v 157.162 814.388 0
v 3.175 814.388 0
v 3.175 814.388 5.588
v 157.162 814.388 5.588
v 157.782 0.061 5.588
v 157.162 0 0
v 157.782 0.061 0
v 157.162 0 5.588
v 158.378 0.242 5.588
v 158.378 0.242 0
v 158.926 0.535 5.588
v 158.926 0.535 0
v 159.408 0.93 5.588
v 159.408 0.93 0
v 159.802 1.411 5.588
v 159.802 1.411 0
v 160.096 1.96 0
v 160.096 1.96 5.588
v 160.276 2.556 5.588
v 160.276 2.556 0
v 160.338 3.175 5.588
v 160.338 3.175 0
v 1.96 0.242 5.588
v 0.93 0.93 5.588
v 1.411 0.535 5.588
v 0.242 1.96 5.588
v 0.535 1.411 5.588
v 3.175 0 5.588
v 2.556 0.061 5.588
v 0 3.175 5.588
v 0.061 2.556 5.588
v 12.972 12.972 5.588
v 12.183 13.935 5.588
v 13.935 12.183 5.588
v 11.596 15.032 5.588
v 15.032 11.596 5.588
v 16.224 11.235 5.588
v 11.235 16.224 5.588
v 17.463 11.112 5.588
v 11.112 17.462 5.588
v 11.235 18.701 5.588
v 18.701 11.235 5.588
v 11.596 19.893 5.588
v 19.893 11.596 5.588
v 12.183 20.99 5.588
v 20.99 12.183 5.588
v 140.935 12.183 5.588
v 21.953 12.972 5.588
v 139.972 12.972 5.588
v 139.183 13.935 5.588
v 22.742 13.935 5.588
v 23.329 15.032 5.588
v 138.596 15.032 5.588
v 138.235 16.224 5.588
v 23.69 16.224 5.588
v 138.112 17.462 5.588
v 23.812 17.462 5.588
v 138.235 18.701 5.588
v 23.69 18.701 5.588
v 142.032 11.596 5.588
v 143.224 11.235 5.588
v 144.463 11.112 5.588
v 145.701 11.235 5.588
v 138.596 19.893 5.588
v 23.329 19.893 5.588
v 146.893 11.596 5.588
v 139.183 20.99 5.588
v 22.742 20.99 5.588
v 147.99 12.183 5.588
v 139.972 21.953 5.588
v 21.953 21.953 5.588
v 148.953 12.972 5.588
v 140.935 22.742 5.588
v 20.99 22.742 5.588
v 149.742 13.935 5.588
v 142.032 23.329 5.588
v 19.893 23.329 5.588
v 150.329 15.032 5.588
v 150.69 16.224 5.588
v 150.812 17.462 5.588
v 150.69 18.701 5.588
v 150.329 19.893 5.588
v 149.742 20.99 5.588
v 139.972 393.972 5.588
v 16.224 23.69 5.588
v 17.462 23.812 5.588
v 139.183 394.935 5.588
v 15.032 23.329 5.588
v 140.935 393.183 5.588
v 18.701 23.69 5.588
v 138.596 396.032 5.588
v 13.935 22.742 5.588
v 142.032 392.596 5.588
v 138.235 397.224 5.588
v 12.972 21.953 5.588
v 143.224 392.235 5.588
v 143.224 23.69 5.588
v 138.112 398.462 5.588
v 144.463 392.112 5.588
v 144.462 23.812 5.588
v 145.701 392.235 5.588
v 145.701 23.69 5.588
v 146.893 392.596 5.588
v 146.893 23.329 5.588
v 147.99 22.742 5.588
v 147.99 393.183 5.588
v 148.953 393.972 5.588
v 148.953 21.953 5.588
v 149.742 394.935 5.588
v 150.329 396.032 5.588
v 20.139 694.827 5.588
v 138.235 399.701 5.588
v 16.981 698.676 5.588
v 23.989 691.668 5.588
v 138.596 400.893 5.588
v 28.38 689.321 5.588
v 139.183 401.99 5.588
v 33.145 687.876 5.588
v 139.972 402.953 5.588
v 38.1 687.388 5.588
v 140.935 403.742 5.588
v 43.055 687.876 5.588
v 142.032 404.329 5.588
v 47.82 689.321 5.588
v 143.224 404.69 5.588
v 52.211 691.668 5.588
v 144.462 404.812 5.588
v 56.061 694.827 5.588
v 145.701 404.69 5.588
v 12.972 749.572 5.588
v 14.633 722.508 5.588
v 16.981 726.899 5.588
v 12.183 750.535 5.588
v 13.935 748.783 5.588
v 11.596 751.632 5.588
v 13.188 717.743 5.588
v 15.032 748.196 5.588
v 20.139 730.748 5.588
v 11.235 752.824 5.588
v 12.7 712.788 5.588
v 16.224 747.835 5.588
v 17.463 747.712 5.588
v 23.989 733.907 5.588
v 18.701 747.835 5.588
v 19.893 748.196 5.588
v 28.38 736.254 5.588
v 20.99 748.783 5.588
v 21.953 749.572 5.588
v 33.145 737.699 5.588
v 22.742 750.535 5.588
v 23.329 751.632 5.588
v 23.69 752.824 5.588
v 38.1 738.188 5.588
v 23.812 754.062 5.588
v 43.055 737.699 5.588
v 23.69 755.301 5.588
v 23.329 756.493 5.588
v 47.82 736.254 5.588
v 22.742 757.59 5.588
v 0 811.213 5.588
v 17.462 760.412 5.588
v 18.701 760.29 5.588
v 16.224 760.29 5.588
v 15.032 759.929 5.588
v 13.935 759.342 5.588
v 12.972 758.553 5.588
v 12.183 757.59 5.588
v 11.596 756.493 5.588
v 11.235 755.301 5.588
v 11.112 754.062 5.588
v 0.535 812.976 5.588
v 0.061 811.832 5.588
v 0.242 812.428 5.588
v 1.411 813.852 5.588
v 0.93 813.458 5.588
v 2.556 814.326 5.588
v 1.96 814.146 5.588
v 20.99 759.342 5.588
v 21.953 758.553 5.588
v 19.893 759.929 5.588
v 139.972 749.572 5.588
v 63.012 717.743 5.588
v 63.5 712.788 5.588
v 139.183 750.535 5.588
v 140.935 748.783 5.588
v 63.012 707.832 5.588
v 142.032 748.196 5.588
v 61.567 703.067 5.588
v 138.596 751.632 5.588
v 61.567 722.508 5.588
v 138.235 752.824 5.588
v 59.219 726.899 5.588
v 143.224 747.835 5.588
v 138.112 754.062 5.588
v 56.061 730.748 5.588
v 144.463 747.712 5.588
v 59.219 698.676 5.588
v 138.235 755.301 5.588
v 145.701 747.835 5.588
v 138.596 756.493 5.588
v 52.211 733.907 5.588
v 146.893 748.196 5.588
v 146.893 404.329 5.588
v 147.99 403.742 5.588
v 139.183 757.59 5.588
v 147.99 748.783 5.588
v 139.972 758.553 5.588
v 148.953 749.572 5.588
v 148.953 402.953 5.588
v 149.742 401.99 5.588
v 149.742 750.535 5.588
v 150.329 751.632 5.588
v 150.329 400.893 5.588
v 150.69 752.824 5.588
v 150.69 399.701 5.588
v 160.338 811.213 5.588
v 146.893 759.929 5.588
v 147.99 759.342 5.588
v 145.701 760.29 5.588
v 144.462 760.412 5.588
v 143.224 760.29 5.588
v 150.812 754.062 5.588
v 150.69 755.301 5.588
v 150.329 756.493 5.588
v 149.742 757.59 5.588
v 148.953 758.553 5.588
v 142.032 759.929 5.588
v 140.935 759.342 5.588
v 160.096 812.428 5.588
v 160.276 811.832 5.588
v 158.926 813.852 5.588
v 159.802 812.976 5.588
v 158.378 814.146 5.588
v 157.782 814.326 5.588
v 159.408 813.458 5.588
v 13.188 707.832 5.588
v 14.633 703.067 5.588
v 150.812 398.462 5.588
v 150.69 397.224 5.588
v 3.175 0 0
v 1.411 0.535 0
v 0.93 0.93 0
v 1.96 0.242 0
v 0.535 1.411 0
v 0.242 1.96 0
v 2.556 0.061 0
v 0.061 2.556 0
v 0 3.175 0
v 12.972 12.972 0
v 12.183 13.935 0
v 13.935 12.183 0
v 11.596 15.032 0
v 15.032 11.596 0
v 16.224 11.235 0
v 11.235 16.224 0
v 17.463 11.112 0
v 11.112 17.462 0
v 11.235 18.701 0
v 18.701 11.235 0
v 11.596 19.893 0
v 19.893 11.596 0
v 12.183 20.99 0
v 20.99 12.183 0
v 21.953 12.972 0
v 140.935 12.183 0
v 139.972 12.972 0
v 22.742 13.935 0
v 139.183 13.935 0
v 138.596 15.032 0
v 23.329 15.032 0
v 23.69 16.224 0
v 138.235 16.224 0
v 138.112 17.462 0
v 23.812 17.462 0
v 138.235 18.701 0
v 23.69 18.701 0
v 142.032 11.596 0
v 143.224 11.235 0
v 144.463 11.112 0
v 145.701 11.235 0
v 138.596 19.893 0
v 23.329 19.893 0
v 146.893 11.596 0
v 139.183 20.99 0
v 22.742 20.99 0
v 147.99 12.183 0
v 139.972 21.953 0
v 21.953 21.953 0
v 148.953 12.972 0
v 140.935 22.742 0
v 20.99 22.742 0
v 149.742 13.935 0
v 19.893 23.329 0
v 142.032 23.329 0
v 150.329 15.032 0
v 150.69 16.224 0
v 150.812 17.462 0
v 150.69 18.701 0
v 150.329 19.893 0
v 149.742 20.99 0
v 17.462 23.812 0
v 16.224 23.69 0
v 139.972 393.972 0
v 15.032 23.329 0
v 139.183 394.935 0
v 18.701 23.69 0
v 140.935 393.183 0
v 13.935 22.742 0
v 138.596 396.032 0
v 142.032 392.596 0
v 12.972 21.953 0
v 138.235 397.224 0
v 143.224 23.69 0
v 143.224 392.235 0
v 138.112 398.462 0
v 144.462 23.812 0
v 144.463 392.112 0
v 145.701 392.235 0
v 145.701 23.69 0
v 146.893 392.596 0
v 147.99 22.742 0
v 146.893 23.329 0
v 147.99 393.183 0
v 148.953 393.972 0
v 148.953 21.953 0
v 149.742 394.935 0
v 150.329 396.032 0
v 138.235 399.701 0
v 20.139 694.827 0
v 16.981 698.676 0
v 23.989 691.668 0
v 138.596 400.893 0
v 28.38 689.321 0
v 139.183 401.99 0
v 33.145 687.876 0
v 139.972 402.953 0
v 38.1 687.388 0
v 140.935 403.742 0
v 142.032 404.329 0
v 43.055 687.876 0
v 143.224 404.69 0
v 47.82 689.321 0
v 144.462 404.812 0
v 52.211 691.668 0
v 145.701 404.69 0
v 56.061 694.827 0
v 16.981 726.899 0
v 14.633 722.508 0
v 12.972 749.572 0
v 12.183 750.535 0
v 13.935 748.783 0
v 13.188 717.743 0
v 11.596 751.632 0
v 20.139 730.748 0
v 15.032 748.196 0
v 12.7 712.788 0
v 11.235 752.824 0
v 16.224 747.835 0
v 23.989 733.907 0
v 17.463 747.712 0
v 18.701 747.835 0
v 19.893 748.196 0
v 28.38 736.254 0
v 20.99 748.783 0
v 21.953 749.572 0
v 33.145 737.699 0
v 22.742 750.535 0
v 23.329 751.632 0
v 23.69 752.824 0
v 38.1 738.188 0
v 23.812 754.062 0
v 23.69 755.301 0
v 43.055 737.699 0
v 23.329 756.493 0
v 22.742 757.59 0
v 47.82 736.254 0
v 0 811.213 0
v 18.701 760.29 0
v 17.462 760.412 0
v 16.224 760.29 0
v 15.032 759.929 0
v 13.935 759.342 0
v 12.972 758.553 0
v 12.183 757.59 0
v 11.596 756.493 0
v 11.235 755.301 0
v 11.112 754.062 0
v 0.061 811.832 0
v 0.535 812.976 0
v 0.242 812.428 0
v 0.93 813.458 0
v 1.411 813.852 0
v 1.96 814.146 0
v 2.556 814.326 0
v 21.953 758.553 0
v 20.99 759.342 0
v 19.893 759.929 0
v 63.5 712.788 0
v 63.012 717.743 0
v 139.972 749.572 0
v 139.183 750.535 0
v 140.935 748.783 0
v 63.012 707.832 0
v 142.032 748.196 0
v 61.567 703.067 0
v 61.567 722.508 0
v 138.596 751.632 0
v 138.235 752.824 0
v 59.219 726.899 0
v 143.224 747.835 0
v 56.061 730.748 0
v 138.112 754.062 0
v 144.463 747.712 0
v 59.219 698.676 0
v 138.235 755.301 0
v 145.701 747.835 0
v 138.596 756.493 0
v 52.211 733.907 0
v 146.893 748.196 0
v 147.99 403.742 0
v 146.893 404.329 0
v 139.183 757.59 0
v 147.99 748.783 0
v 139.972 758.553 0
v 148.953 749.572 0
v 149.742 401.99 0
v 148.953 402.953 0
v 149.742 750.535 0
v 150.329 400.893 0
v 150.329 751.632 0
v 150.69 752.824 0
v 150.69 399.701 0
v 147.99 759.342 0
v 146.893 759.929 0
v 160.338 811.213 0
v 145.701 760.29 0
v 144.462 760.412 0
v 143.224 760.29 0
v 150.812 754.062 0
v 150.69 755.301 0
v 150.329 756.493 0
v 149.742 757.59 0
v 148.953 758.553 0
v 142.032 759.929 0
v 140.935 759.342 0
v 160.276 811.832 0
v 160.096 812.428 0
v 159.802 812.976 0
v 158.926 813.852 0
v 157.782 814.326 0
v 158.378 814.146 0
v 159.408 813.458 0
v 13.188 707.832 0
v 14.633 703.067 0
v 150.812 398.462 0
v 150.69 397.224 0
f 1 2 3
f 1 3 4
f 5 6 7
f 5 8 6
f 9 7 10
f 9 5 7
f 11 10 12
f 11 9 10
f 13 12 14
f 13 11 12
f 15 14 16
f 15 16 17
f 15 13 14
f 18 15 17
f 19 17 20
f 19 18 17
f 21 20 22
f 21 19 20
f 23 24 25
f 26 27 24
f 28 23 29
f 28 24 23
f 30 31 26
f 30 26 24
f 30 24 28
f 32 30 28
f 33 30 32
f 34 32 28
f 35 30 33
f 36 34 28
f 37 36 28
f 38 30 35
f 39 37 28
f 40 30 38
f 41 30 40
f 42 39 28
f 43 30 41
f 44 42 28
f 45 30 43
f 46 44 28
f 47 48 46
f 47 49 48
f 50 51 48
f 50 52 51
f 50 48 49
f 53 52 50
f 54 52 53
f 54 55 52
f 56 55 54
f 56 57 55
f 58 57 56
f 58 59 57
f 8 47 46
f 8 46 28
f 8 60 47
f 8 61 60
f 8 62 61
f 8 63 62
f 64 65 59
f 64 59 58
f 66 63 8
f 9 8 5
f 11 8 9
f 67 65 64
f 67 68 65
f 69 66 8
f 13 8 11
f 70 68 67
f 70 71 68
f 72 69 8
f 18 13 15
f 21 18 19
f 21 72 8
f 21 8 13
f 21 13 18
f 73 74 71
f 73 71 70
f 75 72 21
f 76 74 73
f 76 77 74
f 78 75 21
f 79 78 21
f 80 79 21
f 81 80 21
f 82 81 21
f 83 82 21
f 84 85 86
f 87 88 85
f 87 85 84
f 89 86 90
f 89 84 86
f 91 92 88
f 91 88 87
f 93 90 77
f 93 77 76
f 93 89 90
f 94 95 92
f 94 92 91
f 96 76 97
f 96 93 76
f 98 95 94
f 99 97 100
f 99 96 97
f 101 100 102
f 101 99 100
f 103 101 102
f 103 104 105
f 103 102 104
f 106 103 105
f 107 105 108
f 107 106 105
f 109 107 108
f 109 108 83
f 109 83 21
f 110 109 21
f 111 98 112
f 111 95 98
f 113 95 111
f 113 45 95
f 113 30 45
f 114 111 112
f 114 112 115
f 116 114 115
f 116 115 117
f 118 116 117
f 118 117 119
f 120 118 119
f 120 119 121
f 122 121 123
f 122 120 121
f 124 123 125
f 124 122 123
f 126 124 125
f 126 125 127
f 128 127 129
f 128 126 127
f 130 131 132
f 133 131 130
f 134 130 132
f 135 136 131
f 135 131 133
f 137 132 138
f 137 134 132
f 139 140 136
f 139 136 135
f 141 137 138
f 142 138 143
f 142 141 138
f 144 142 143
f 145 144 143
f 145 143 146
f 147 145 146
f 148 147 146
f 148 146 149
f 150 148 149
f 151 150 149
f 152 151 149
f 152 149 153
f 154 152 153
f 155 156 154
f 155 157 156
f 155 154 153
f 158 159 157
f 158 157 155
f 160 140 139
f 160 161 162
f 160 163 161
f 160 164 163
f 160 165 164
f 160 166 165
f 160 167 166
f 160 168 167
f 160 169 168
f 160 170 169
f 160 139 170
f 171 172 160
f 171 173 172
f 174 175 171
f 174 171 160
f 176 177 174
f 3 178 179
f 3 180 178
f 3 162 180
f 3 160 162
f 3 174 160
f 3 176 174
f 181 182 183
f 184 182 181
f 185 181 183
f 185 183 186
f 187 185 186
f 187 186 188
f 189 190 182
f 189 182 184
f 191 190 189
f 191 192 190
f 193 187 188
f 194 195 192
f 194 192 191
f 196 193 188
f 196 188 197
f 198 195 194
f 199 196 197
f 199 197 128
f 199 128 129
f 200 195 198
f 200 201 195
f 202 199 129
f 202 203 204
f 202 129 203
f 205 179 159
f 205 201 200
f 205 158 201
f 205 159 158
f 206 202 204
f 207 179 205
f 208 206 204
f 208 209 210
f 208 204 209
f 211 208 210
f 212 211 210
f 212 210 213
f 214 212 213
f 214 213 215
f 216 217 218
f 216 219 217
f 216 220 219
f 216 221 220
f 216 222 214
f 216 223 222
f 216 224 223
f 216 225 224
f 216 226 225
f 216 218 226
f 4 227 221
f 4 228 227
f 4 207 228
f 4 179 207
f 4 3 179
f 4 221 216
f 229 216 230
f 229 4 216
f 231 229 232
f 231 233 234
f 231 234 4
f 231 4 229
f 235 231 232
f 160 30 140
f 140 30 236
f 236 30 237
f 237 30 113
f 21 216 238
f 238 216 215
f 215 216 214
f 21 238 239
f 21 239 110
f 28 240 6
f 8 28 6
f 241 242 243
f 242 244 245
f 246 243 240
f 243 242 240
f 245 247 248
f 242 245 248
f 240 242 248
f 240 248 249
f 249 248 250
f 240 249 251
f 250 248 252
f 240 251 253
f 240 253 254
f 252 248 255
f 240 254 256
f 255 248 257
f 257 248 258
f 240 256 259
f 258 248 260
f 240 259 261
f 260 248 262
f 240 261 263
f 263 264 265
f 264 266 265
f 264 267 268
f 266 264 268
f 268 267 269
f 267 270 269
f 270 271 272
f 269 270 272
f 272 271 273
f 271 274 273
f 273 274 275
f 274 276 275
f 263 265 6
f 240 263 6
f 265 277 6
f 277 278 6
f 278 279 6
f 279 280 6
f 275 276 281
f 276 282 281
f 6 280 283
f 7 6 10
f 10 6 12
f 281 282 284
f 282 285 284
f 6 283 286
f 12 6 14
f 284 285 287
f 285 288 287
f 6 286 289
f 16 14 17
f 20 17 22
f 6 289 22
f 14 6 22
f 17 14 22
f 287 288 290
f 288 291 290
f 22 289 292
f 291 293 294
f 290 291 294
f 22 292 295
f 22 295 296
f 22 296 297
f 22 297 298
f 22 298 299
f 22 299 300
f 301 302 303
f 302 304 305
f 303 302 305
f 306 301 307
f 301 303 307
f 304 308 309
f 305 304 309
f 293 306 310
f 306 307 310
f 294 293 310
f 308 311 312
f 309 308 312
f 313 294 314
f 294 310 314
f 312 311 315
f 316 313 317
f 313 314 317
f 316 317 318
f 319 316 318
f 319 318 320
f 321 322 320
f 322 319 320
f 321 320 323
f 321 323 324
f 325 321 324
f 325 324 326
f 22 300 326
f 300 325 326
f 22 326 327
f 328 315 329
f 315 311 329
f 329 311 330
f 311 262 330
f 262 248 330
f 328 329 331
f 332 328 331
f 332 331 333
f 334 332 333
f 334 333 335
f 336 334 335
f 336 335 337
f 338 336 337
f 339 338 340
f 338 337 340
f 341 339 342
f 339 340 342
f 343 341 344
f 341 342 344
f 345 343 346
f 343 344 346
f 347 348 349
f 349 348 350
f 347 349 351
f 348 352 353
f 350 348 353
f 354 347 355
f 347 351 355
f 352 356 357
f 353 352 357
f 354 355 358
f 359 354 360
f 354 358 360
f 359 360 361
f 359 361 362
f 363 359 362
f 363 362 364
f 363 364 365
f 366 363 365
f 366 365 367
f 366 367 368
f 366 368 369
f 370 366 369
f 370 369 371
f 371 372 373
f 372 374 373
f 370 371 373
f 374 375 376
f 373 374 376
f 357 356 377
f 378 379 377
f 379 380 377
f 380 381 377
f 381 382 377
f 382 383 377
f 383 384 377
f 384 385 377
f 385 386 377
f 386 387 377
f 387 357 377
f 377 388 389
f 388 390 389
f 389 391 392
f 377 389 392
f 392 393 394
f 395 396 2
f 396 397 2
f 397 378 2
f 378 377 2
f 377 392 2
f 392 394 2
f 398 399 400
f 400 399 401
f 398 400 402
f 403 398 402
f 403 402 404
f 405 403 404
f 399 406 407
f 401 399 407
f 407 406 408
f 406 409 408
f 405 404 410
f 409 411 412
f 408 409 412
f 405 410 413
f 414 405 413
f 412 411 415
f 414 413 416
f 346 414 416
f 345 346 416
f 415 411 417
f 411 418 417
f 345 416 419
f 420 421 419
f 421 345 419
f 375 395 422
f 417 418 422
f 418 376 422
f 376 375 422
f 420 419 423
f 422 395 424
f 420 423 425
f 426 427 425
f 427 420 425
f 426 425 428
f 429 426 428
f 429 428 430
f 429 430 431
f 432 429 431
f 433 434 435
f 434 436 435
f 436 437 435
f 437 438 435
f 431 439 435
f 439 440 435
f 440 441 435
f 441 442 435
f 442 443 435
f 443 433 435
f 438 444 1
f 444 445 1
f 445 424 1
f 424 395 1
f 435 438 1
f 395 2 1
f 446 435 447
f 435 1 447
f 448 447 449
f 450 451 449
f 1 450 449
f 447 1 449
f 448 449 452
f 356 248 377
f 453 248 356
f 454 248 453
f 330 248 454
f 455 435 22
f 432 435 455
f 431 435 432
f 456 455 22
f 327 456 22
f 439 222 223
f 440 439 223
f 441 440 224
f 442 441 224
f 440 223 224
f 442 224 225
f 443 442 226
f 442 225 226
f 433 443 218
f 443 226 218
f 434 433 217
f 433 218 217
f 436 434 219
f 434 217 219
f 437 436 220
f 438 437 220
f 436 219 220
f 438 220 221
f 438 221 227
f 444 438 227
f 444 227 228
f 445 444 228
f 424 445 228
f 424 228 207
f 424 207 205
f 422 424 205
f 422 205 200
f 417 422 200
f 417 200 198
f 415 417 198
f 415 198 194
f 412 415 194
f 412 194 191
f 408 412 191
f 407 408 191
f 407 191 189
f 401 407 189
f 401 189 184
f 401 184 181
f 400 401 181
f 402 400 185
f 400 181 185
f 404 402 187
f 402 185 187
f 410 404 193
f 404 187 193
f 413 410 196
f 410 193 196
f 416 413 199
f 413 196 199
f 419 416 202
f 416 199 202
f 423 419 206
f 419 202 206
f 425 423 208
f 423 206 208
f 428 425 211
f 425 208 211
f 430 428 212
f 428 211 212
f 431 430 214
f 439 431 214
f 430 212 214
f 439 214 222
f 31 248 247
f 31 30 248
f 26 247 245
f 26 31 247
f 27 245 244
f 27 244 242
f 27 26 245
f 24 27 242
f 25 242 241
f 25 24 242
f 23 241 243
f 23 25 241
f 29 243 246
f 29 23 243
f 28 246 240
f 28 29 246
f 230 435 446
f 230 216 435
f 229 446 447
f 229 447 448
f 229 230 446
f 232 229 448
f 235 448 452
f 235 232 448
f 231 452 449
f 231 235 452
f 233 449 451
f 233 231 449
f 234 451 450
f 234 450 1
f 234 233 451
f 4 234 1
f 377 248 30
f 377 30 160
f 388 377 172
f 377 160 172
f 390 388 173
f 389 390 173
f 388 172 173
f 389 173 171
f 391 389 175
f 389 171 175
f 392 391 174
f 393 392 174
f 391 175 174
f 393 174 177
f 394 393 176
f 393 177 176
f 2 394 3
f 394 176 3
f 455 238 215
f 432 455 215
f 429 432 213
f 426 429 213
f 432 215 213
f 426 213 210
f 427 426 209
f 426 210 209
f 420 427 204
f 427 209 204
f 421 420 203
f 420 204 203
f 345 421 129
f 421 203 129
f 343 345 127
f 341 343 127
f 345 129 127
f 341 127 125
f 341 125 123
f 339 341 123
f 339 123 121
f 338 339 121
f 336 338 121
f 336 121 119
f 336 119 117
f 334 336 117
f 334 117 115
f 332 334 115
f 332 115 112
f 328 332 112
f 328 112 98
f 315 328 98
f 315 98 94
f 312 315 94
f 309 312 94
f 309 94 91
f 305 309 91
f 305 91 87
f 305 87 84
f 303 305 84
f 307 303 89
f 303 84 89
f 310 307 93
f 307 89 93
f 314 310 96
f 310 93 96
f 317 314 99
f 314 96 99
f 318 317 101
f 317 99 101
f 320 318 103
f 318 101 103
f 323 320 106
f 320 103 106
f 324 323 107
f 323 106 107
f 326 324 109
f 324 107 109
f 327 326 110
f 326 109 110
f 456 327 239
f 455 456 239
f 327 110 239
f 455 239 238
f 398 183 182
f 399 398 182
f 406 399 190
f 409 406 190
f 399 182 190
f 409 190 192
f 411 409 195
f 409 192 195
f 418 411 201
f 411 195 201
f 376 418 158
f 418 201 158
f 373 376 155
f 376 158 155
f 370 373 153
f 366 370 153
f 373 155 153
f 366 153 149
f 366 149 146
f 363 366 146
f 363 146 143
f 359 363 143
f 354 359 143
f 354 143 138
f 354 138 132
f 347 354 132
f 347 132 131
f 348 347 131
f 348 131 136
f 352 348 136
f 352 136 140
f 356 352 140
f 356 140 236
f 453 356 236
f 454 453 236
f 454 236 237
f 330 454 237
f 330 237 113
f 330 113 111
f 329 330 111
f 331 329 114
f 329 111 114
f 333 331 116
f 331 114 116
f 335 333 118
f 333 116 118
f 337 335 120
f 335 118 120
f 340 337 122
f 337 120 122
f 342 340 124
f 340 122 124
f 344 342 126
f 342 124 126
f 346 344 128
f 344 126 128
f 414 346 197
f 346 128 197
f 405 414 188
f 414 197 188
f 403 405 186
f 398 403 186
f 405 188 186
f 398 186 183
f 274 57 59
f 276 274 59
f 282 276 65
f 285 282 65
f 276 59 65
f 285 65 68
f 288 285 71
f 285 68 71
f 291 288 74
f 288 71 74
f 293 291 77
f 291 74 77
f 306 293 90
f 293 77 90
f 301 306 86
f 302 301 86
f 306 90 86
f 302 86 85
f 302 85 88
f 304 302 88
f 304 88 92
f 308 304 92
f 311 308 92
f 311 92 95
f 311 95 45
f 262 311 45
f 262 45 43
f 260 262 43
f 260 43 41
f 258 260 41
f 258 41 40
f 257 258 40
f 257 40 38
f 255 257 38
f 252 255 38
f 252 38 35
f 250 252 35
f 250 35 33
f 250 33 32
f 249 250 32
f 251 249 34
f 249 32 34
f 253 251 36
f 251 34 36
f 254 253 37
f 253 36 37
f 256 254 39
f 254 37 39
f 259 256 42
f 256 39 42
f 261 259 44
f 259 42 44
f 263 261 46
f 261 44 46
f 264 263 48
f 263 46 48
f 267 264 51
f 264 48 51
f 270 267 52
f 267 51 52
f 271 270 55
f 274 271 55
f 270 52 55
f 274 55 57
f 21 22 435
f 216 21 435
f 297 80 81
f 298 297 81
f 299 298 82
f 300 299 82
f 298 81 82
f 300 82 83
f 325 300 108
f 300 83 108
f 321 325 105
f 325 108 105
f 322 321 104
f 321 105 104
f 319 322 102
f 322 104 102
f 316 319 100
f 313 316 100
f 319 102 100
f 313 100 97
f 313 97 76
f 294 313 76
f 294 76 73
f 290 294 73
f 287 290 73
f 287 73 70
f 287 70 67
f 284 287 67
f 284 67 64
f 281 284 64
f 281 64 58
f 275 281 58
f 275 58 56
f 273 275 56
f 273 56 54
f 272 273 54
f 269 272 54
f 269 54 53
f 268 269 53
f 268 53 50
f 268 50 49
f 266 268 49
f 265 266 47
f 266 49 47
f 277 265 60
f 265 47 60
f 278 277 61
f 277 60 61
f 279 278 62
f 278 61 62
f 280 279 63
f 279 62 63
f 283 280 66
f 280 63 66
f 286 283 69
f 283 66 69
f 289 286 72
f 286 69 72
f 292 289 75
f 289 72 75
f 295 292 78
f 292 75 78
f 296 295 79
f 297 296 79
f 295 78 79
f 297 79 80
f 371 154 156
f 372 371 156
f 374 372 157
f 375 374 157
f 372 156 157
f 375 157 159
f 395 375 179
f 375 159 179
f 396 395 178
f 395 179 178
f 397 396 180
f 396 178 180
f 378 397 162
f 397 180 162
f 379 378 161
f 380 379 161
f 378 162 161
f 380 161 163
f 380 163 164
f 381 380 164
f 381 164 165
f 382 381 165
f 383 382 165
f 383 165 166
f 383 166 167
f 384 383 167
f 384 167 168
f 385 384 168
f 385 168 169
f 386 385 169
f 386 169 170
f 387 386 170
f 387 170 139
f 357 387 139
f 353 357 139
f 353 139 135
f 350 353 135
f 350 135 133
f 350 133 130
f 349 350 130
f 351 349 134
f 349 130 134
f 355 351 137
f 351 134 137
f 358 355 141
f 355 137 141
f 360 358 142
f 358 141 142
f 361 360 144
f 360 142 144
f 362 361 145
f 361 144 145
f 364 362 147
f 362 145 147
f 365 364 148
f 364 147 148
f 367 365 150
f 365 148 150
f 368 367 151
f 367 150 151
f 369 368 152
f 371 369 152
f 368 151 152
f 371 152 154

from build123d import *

# Parameters (mm, degrees)
SKETCH1_W           = 160.3375
SKETCH1_H           = 814.3875
BOSS_EXTRUDE1_DEPTH = 5.588
FILLET1_R           = 3.175
SKETCH2_R           = 6.35
CUT_EXTRUDE1_DEPTH  = 6.35
SKETCH3_R           = 25.4
CUT_EXTRUDE2_DEPTH  = 831.039962777


with BuildPart() as part:
    # Sketch1 → Boss-Extrude1 (new body)
    with BuildSketch(Plane.XY):
        with Locations((80.16875, 407.19375)):
            Rectangle(SKETCH1_W, SKETCH1_H)
    extrude(amount=BOSS_EXTRUDE1_DEPTH)

    # Fillet1
    fillet1_edges = [part.edges().sort_by_distance(p)[0] for p in [
        (0, 814.3875, 2.794),
        (160.3375, 814.3875, 2.794),
        (160.3375, 0, 2.794),
        (0, 0, 2.794),
    ]]
    fillet(fillet1_edges, radius=FILLET1_R)

    # Sketch2 → Cut-Extrude1 (cut)
    with BuildSketch(Plane.XY.offset(5.588)):
        with Locations((17.4625, 754.0625)):
            Circle(SKETCH2_R)
        with Locations((144.4625, 754.0625)):
            Circle(SKETCH2_R)
        with Locations((17.4625, 17.4625)):
            Circle(SKETCH2_R)
        with Locations((144.4625, 17.4625)):
            Circle(SKETCH2_R)
        with Locations((144.4625, 398.4625)):
            Circle(SKETCH2_R)
    extrude(amount=-CUT_EXTRUDE1_DEPTH, mode=Mode.SUBTRACT)

    # Sketch3 → Cut-Extrude2 (cut, through all)
    with BuildSketch(Plane.XY.offset(5.588)):
        with Locations((38.1, 712.7875)):
            Circle(SKETCH3_R)
    extrude(amount=-CUT_EXTRUDE2_DEPTH, mode=Mode.SUBTRACT)


solid = part.part
